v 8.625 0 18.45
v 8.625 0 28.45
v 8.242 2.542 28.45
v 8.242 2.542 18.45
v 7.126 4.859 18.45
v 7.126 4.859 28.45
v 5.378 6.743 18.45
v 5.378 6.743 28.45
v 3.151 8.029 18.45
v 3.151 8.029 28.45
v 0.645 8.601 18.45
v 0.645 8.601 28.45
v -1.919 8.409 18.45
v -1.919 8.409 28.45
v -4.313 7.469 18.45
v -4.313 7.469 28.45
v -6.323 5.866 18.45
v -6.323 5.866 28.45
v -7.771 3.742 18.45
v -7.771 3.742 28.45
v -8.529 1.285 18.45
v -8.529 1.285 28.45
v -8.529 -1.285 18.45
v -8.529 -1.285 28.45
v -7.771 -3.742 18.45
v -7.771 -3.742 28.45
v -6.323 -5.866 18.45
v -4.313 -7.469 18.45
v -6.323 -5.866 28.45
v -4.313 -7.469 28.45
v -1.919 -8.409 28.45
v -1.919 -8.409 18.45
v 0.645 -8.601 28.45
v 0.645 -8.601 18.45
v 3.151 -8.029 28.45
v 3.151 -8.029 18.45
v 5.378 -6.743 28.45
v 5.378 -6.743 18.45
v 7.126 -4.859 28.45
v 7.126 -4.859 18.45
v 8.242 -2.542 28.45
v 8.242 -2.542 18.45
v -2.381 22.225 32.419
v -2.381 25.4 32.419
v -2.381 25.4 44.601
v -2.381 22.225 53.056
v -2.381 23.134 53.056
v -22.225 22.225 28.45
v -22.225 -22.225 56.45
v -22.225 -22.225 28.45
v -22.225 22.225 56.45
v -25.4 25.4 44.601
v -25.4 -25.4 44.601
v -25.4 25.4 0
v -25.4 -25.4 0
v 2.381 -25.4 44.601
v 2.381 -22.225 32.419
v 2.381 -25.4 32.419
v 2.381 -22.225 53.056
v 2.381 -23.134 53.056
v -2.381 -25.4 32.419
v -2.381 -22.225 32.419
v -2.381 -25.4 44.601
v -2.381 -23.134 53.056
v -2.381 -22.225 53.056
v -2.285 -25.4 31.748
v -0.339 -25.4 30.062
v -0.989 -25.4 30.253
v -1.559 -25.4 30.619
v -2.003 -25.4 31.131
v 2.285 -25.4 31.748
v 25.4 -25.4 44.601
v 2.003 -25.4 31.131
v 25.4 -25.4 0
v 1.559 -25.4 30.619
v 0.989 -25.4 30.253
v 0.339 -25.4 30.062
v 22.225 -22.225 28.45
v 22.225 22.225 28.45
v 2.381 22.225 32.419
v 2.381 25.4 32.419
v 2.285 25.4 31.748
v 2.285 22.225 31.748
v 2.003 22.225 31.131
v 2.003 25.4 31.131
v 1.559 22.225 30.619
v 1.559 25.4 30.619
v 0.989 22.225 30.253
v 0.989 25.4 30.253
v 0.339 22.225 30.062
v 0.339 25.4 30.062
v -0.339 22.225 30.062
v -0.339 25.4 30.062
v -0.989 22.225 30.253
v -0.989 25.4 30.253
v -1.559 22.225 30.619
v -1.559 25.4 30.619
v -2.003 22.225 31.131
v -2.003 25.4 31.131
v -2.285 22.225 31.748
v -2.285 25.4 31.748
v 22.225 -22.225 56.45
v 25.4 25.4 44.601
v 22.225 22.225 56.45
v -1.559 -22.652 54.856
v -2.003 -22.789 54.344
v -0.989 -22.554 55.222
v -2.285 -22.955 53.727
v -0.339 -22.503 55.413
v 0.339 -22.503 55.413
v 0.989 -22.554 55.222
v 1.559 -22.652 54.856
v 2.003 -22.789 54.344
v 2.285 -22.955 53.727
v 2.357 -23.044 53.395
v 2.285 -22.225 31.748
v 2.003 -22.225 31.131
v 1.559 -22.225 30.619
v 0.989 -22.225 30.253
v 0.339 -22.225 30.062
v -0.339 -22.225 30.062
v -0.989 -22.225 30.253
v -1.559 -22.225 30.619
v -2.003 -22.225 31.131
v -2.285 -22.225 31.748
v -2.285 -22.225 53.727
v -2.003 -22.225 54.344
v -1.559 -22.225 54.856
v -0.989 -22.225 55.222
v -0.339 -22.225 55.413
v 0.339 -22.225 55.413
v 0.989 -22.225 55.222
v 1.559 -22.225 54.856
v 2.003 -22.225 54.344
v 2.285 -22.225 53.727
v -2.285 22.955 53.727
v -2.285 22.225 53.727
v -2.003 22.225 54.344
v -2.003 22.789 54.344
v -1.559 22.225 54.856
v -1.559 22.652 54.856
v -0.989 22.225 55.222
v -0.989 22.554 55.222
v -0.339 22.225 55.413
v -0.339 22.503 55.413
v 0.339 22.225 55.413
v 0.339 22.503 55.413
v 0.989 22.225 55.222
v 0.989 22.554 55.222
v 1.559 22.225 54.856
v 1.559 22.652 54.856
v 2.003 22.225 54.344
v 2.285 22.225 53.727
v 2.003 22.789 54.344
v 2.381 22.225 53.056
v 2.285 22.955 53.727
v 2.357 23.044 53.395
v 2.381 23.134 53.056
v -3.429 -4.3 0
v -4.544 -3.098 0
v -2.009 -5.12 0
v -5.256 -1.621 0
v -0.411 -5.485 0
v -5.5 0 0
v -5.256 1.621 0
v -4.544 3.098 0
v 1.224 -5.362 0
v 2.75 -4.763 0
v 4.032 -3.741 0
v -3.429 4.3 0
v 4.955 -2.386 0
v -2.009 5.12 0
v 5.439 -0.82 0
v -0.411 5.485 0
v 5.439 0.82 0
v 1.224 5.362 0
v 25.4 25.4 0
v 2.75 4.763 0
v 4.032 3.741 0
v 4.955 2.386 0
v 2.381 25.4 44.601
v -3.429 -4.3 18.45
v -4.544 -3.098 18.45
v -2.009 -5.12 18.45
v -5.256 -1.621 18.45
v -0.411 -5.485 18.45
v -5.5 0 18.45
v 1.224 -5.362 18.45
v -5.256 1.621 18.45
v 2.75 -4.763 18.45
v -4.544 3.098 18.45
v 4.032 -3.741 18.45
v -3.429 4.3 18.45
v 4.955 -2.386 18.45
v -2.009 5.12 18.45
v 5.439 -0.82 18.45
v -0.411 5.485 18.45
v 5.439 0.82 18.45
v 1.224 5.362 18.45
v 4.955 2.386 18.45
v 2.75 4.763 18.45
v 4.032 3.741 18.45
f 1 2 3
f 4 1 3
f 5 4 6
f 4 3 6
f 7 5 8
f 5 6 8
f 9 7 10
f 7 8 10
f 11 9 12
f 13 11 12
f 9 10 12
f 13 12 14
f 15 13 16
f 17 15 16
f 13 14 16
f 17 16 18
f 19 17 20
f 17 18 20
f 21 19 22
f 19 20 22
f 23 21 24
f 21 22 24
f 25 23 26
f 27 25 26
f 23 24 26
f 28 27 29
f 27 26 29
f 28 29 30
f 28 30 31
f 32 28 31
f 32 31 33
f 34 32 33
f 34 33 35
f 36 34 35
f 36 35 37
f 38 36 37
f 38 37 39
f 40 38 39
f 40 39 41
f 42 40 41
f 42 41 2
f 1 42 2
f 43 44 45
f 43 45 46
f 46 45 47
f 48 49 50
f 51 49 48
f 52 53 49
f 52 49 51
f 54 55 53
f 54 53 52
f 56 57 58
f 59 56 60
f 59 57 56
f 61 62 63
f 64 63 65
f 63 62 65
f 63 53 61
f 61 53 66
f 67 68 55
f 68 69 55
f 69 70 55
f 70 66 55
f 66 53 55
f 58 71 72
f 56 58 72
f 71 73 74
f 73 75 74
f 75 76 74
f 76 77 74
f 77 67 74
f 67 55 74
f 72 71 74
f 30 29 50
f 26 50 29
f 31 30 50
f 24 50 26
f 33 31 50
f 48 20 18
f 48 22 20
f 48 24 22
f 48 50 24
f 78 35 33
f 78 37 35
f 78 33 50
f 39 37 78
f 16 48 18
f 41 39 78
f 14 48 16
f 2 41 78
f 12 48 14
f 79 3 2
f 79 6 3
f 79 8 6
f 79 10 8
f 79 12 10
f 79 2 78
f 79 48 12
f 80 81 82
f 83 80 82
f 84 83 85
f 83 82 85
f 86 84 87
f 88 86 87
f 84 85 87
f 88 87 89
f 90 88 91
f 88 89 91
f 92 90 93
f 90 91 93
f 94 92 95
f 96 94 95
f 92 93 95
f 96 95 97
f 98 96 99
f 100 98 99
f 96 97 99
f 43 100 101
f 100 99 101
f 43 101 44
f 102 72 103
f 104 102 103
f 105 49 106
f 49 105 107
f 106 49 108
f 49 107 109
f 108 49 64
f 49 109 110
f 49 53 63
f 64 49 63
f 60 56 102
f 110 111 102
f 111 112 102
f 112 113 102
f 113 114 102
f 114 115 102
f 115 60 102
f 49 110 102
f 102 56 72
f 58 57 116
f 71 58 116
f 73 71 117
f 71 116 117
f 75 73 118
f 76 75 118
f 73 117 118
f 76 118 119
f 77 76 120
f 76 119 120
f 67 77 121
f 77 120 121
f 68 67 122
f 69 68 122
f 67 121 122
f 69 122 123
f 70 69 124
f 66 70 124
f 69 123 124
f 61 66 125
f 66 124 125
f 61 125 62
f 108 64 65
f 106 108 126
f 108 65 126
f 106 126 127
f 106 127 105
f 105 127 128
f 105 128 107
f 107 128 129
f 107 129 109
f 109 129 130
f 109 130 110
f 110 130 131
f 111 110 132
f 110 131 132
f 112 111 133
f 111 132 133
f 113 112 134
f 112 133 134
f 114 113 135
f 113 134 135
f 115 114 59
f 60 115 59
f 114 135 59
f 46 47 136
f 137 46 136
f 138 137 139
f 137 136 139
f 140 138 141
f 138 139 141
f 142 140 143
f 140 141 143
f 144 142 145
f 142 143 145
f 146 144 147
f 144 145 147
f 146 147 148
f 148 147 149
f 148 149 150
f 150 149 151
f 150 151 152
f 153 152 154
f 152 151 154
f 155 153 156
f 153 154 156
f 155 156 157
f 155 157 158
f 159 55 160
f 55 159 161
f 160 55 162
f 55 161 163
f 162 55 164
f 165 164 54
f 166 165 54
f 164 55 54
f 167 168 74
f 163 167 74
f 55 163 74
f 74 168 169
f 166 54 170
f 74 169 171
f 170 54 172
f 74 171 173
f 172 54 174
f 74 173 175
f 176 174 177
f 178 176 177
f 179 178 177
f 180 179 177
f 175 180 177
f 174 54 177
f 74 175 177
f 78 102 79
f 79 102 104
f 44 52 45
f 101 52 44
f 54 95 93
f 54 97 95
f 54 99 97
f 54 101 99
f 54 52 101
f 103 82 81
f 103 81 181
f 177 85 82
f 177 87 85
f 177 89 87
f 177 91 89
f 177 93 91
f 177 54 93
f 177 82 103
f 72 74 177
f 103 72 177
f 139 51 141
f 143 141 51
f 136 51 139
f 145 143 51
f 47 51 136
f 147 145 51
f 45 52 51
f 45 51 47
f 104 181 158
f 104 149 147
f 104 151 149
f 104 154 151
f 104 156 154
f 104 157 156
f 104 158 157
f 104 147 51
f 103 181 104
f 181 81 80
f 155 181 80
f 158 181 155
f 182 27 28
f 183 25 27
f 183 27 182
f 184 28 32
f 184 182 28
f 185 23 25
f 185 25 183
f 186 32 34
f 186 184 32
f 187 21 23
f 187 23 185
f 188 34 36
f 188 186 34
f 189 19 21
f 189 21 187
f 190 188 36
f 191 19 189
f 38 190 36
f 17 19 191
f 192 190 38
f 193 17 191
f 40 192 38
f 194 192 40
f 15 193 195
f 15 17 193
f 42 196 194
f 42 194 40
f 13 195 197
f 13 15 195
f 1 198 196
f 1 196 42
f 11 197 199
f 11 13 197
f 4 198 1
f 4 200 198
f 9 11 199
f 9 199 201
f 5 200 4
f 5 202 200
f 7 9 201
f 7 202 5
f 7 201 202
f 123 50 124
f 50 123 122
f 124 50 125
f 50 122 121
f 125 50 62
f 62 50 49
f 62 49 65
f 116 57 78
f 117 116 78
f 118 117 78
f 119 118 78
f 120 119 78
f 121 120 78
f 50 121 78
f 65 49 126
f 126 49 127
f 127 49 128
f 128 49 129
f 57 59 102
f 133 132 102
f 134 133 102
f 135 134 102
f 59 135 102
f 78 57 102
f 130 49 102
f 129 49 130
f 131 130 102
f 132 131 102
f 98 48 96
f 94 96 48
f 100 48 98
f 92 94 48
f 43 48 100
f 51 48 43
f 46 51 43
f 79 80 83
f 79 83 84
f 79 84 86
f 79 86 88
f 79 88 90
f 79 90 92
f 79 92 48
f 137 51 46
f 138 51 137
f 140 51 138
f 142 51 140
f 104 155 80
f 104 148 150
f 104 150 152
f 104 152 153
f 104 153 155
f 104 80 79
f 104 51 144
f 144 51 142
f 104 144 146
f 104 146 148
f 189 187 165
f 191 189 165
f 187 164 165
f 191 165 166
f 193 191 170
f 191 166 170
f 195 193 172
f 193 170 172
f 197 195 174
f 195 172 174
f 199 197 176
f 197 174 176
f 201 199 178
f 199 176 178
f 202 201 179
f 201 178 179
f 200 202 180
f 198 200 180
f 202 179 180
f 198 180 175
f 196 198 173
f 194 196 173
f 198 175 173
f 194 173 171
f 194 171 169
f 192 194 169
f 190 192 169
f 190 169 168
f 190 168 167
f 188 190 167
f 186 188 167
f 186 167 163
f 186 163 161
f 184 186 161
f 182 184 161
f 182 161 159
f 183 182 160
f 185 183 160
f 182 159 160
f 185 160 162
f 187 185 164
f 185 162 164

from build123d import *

# Parameters (mm, degrees)
F0_W           = 50.8
F0_H           = 50.8
F1_DEPTH       = 56.45
F2_W           = 44.45
F2_H           = 44.45
F3_DEPTH       = 28
F5_D           = 11
F5_CBORE_D     = 17.25
F5_CBORE_DEPTH = 10
F6_SIZE2       = 11.849251
F6_SIZE        = 3.17499
F8_W           = 4.7625
F8_H           = 20.6375
F9_DEPTH       = 50.801


# Not quite as in the source:
# - a fillet or chamfer is up to 0.001 mm smaller than in the source, because OpenCascade refuses the exact size


with BuildPart() as f1:
    # F0 (on Top) → F1 (new body)
    with BuildSketch(Plane.XY):
        Rectangle(F0_W, F0_H)
    extrude(amount=F1_DEPTH)

    # F2 (on face) → F3 (cut)
    with BuildSketch(Plane.XY.offset(56.45)):
        Rectangle(F2_W, F2_H)
    extrude(amount=-F3_DEPTH, mode=Mode.SUBTRACT)

    # F5 (through all)
    with Locations(Plane.XY.offset(28.45)):
        with Locations((0, 0)):
            CounterBoreHole(F5_D / 2, F5_CBORE_D / 2, F5_CBORE_DEPTH)

    # F6 (size 3.175 and 11.849261314 in the source; OpenCascade refuses exactly that, so slightly less here)
    f6_edges = [f1.edges().sort_by_distance(p)[0] for p in [
        (0, 25.4, 56.45),
        (25.4, 0, 56.45),
        (0, -25.4, 56.45),
        (-25.4, 0, 56.45),
    ]]
    f6_side = f1.faces().sort_by_distance((0, -24.68158, 56.45))[0]
    chamfer(f6_edges, length=F6_SIZE, length2=F6_SIZE2, reference=f6_side)

    # F8 (on offset) → F9 (cut, through all)
    with BuildSketch(Plane(origin=(0, 25.4, 0), x_dir=(-1, 0, 0), z_dir=(0, 1, 0))):
        with BuildLine():
            ThreePointArc((-2.38125, 32.41875), (0, 30.0375), (2.38125, 32.41875))
            Line((2.38125, 32.41875), (-2.38125, 32.41875))
        make_face()
        with Locations((0, 42.7375)):
            Rectangle(F8_W, F8_H)
        with BuildLine():
            Line((-2.38125, 53.05625), (2.38125, 53.05625))
            ThreePointArc((2.38125, 53.05625), (0, 55.4375), (-2.38125, 53.05625))
        make_face()
    extrude(amount=-F9_DEPTH, mode=Mode.SUBTRACT)


solid = f1.part
